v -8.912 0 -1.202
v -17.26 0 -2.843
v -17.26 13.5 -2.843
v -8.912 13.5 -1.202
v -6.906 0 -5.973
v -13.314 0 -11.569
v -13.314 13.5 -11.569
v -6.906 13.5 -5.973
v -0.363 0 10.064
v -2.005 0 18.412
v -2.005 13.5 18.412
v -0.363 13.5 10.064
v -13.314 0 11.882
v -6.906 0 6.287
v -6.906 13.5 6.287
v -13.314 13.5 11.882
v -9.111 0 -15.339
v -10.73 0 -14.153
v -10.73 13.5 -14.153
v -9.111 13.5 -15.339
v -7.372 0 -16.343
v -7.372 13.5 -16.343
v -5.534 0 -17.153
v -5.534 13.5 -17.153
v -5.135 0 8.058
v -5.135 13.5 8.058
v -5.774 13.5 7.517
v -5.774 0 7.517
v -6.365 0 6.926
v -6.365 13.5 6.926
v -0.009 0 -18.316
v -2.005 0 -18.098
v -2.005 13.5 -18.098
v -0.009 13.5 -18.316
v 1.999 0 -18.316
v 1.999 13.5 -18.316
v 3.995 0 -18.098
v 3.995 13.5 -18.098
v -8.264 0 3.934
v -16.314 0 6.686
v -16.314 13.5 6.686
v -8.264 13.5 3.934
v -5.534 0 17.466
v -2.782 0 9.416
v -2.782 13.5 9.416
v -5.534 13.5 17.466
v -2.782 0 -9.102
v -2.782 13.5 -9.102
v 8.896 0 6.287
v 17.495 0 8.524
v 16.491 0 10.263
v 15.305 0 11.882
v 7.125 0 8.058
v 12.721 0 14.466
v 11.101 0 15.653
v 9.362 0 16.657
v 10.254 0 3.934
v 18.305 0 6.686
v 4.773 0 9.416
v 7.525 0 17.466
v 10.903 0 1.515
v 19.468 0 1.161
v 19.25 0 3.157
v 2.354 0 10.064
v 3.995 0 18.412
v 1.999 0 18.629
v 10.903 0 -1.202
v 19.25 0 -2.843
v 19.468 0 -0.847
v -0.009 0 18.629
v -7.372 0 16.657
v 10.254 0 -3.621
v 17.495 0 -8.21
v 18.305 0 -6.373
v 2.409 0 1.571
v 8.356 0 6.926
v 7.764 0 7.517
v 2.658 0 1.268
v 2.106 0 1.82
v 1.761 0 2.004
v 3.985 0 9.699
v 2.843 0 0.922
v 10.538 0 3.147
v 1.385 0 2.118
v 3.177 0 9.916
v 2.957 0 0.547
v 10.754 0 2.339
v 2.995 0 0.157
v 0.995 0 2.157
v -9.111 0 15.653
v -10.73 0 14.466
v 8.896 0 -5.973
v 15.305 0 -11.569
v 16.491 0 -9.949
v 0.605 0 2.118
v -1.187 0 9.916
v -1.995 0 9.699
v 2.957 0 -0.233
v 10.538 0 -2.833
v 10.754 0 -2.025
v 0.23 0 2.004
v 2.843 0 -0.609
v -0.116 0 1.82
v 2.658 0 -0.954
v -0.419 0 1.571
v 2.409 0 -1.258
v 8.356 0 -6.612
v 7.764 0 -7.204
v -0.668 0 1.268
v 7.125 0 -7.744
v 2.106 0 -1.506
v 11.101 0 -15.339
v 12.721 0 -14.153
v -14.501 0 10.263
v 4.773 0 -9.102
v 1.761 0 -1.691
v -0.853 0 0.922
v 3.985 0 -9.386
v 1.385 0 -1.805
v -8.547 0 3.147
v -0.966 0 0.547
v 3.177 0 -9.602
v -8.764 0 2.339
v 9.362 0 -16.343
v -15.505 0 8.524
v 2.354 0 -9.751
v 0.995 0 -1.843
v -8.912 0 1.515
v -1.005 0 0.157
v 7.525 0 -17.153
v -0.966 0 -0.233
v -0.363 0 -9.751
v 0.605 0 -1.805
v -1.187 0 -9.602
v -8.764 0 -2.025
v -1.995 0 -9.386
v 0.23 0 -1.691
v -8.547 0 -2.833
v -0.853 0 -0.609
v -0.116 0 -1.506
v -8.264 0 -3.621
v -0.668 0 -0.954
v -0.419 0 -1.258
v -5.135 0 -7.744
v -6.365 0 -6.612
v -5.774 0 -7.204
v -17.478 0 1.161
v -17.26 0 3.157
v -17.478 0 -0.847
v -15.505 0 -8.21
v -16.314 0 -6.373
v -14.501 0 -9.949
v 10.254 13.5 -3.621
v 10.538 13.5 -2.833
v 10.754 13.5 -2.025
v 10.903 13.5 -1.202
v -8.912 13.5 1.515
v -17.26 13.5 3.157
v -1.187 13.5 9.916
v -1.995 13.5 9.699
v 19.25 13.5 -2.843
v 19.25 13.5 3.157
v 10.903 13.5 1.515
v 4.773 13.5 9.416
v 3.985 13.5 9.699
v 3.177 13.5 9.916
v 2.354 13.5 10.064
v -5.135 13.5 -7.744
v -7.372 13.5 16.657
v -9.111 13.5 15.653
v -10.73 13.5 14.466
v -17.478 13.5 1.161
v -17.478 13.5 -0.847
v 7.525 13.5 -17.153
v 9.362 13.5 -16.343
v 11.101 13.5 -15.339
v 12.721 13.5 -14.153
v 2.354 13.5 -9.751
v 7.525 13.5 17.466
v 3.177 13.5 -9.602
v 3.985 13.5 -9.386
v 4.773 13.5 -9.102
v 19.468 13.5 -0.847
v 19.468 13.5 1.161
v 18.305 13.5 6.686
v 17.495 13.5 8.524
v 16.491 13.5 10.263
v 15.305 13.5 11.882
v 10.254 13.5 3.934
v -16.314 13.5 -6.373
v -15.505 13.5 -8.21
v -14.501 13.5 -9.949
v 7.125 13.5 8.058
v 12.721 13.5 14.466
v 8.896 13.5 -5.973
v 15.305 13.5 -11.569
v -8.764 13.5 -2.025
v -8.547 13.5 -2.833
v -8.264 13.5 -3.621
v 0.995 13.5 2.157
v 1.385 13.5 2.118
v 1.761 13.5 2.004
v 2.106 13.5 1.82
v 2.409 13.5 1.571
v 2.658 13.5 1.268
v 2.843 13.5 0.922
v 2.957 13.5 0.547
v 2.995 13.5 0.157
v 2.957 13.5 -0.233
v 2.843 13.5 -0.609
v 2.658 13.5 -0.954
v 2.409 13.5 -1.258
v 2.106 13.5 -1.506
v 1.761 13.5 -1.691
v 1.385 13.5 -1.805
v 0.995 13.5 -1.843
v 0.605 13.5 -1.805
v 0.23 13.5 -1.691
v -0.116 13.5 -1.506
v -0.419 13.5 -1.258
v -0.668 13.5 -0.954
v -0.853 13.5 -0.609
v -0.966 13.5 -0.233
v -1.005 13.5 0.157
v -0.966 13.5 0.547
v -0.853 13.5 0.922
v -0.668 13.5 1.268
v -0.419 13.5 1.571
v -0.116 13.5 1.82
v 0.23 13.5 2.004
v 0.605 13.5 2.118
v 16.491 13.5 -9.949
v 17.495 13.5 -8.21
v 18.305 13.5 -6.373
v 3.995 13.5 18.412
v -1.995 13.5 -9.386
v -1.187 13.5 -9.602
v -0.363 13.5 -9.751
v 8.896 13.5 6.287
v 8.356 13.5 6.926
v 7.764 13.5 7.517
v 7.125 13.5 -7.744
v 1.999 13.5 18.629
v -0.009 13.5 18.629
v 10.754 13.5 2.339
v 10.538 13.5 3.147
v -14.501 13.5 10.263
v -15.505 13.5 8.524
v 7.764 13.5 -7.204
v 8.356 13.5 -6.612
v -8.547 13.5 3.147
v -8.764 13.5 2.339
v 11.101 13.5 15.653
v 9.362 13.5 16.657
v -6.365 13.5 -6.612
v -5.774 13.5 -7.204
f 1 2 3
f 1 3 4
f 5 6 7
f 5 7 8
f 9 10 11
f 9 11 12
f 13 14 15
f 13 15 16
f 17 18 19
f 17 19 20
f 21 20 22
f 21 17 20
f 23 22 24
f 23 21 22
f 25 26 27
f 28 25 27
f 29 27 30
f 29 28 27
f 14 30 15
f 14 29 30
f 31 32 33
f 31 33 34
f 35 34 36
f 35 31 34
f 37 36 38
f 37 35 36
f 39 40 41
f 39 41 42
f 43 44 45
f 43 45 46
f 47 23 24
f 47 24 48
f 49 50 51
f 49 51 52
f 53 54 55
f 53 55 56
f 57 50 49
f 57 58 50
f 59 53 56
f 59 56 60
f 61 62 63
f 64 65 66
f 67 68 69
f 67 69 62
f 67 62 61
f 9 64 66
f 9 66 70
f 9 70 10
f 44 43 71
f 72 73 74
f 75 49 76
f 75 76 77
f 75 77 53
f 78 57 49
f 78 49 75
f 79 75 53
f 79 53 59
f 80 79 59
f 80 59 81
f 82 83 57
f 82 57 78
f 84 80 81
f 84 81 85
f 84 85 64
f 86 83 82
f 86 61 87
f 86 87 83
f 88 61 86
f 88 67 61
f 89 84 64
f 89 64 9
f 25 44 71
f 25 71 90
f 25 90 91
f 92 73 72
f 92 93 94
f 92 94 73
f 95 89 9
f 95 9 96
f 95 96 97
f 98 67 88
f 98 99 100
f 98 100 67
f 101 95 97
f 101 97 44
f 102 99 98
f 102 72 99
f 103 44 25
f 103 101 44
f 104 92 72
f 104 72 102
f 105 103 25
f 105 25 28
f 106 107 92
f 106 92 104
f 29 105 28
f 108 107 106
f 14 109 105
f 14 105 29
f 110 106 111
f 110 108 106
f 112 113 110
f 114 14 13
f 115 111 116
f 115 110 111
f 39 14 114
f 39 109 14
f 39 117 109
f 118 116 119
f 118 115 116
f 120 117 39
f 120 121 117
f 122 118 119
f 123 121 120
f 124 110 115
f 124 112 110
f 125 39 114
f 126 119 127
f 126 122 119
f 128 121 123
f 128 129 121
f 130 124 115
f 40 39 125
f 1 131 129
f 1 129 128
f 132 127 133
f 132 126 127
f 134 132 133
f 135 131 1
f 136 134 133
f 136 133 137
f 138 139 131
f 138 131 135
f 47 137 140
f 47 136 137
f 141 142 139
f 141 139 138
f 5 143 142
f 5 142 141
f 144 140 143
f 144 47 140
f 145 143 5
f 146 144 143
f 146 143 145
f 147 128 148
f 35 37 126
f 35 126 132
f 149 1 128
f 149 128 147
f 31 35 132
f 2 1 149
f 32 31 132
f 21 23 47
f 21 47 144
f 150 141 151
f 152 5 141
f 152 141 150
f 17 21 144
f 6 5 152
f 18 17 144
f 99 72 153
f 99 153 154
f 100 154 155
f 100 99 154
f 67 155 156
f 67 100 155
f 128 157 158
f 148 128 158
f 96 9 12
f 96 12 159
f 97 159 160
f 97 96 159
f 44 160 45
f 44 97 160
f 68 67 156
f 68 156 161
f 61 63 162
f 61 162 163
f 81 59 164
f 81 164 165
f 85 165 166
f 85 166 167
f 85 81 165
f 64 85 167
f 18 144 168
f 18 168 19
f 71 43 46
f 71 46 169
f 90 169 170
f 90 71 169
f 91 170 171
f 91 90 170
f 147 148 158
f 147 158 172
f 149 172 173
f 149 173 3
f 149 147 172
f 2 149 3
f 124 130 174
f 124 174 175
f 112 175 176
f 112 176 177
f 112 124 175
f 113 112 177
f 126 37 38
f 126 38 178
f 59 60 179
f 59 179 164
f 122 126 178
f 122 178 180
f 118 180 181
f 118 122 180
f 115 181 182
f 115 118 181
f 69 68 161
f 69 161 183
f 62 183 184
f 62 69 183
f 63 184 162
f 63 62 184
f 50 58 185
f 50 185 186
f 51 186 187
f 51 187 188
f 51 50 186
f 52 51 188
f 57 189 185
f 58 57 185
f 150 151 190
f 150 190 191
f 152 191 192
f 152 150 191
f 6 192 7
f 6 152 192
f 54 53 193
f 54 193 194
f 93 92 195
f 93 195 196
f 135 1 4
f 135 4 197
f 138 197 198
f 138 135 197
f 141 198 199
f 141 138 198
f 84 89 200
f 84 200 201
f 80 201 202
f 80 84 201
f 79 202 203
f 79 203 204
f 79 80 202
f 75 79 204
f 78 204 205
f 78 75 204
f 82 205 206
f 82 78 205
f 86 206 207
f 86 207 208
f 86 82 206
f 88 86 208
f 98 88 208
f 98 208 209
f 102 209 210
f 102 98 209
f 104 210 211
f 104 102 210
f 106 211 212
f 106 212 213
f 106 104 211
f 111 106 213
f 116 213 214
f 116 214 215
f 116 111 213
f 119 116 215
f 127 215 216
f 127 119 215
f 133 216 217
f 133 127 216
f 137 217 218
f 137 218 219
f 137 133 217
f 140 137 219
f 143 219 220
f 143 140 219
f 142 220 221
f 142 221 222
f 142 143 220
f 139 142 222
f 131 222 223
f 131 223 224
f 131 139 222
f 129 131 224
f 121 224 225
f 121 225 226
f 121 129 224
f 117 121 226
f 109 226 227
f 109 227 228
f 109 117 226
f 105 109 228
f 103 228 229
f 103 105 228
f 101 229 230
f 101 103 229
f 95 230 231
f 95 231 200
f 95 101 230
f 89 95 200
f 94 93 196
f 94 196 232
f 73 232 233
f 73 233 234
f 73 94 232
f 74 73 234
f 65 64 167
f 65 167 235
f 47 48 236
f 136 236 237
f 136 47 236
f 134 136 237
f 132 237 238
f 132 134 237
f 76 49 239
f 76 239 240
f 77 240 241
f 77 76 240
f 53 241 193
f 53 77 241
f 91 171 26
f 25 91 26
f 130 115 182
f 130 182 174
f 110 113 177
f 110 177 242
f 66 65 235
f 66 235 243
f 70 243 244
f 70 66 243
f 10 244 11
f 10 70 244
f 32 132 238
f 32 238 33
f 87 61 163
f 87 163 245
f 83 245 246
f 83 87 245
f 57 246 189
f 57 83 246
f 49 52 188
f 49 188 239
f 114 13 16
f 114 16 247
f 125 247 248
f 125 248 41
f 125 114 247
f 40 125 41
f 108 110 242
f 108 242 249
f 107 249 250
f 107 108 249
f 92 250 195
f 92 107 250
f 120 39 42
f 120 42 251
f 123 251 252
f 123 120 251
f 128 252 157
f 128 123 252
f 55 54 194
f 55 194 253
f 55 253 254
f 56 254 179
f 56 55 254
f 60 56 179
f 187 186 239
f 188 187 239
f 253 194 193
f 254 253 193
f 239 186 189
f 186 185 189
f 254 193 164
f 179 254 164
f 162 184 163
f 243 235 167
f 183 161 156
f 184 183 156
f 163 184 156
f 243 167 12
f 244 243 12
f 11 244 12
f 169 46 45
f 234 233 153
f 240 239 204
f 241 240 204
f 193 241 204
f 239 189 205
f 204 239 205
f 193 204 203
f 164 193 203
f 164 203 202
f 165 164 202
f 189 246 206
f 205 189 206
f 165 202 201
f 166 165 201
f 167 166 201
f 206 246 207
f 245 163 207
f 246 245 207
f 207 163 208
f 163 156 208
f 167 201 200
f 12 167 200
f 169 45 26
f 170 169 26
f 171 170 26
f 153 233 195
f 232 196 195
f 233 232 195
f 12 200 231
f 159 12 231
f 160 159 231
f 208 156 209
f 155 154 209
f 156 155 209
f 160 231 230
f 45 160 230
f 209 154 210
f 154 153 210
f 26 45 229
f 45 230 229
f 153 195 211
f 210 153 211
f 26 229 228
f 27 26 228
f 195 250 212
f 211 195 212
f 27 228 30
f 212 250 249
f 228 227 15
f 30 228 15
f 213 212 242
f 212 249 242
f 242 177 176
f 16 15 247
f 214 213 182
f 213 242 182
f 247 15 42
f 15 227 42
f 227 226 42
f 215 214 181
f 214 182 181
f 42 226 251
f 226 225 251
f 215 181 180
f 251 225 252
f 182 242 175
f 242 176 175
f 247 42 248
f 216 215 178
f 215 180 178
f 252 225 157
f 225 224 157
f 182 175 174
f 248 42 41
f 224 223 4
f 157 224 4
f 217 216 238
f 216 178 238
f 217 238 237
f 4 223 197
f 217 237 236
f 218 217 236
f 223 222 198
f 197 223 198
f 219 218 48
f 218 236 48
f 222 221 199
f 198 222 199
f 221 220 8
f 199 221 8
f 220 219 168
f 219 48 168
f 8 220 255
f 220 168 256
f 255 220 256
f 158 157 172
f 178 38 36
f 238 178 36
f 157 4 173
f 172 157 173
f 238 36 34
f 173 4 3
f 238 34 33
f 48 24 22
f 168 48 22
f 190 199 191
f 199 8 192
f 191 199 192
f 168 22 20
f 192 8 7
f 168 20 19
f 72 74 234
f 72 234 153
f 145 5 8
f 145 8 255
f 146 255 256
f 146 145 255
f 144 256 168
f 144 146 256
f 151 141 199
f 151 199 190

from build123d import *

# Parameters (mm, degrees)
SKETCH1_R           = 2
BOSS_EXTRUDE1_DEPTH = 13.5


with BuildPart() as part:
    # Sketch1 → Boss-Extrude1 (new body)
    with BuildSketch(Plane(origin=(0, 0, 0), x_dir=(1, 0, 0), z_dir=(0, 1, 0))):
        with BuildLine():
            Line((-16.314190392, -6.686200591), (-8.263943043, -3.933992685))
            ThreePointArc((-8.263943043, -3.933992685), (-8.664036901, -2.744899122), (-8.912092237, -1.51506696))
            Line((-8.912092237, -1.51506696), (-17.259914901, -3.156708671))
            ThreePointArc((-17.259914901, -3.156708671), (-17.504778638, -0.156708671), (-17.259914901, 2.843291329))
            Line((-17.259914901, 2.843291329), (-8.912092237, 1.201649618))
            ThreePointArc((-8.912092237, 1.201649618), (-8.664036901, 2.43148178), (-8.263943043, 3.620575343))
            Line((-8.263943043, 3.620575343), (-16.314190392, 6.372783249))
            ThreePointArc((-16.314190392, 6.372783249), (-15.026248608, 9.093291329), (-13.314190392, 11.568935672))
            Line((-13.314190392, 11.568935672), (-6.905584753, 5.973320915))
            ThreePointArc((-6.905584753, 5.973320915), (-6.07584645, 6.914359141), (-5.134808223, 7.744097445))
            Line((-5.134808223, 7.744097445), (-10.730422981, 14.152703083))
            ThreePointArc((-10.730422981, 14.152703083), (-8.254778638, 15.864761299), (-5.534270558, 17.152703083))
            Line((-5.534270558, 17.152703083), (-2.782062651, 9.102455734))
            ThreePointArc((-2.782062651, 9.102455734), (-1.592969089, 9.502549592), (-0.363136927, 9.750604929))
            Line((-0.363136927, 9.750604929), (-2.004778638, 18.098427593))
            ThreePointArc((-2.004778638, 18.098427593), (0.995221362, 18.343291329), (3.995221362, 18.098427593))
            Line((3.995221362, 18.098427593), (2.353579652, 9.750604929))
            ThreePointArc((2.353579652, 9.750604929), (3.583411813, 9.502549592), (4.772505376, 9.102455734))
            Line((4.772505376, 9.102455734), (7.524713283, 17.152703083))
            ThreePointArc((7.524713283, 17.152703083), (10.245221362, 15.864761299), (12.720865705, 14.152703083))
            Line((12.720865705, 14.152703083), (7.125250948, 7.744097445))
            ThreePointArc((7.125250948, 7.744097445), (8.066289174, 6.914359141), (8.896027478, 5.973320915))
            Line((8.896027478, 5.973320915), (15.304633116, 11.568935672))
            ThreePointArc((15.304633116, 11.568935672), (17.016691332, 9.093291329), (18.304633116, 6.372783249))
            Line((18.304633116, 6.372783249), (10.254385767, 3.620575343))
            ThreePointArc((10.254385767, 3.620575343), (10.654479625, 2.43148178), (10.902534962, 1.201649618))
            Line((10.902534962, 1.201649618), (19.250357626, 2.843291329))
            ThreePointArc((19.250357626, 2.843291329), (19.495221362, -0.156708671), (19.250357626, -3.156708671))
            Line((19.250357626, -3.156708671), (10.902534962, -1.51506696))
            ThreePointArc((10.902534962, -1.51506696), (10.654479625, -2.744899122), (10.254385767, -3.933992685))
            Line((10.254385767, -3.933992685), (18.304633116, -6.686200591))
            ThreePointArc((18.304633116, -6.686200591), (17.016691332, -9.406708671), (15.304633116, -11.882353014))
            Line((15.304633116, -11.882353014), (8.896027478, -6.286738257))
            ThreePointArc((8.896027478, -6.286738257), (8.066289174, -7.227776483), (7.125250948, -8.057514787))
            Line((7.125250948, -8.057514787), (12.720865705, -14.466120425))
            ThreePointArc((12.720865705, -14.466120425), (10.245221362, -16.178178641), (7.524713283, -17.466120425))
            Line((7.524713283, -17.466120425), (4.772505376, -9.415873076))
            ThreePointArc((4.772505376, -9.415873076), (3.583411813, -9.815966934), (2.353579652, -10.06402227))
            Line((2.353579652, -10.06402227), (3.995221362, -18.411844934))
            ThreePointArc((3.995221362, -18.411844934), (0.995221362, -18.656708671), (-2.004778638, -18.411844934))
            Line((-2.004778638, -18.411844934), (-0.363136927, -10.06402227))
            ThreePointArc((-0.363136927, -10.06402227), (-1.592969089, -9.815966934), (-2.782062651, -9.415873076))
            Line((-2.782062651, -9.415873076), (-5.534270558, -17.466120425))
            ThreePointArc((-5.534270558, -17.466120425), (-8.254778638, -16.178178641), (-10.730422981, -14.466120425))
            Line((-10.730422981, -14.466120425), (-5.134808223, -8.057514787))
            ThreePointArc((-5.134808223, -8.057514787), (-6.07584645, -7.227776483), (-6.905584753, -6.286738257))
            Line((-6.905584753, -6.286738257), (-13.314190392, -11.882353014))
            ThreePointArc((-13.314190392, -11.882353014), (-15.026248608, -9.406708671), (-16.314190392, -6.686200591))
        make_face()
        with Locations(Location((0.995221362, -0.156708671, 0), (0, 0, 270))):
            Circle(SKETCH1_R, mode=Mode.SUBTRACT)
    extrude(amount=BOSS_EXTRUDE1_DEPTH)


solid = part.part
